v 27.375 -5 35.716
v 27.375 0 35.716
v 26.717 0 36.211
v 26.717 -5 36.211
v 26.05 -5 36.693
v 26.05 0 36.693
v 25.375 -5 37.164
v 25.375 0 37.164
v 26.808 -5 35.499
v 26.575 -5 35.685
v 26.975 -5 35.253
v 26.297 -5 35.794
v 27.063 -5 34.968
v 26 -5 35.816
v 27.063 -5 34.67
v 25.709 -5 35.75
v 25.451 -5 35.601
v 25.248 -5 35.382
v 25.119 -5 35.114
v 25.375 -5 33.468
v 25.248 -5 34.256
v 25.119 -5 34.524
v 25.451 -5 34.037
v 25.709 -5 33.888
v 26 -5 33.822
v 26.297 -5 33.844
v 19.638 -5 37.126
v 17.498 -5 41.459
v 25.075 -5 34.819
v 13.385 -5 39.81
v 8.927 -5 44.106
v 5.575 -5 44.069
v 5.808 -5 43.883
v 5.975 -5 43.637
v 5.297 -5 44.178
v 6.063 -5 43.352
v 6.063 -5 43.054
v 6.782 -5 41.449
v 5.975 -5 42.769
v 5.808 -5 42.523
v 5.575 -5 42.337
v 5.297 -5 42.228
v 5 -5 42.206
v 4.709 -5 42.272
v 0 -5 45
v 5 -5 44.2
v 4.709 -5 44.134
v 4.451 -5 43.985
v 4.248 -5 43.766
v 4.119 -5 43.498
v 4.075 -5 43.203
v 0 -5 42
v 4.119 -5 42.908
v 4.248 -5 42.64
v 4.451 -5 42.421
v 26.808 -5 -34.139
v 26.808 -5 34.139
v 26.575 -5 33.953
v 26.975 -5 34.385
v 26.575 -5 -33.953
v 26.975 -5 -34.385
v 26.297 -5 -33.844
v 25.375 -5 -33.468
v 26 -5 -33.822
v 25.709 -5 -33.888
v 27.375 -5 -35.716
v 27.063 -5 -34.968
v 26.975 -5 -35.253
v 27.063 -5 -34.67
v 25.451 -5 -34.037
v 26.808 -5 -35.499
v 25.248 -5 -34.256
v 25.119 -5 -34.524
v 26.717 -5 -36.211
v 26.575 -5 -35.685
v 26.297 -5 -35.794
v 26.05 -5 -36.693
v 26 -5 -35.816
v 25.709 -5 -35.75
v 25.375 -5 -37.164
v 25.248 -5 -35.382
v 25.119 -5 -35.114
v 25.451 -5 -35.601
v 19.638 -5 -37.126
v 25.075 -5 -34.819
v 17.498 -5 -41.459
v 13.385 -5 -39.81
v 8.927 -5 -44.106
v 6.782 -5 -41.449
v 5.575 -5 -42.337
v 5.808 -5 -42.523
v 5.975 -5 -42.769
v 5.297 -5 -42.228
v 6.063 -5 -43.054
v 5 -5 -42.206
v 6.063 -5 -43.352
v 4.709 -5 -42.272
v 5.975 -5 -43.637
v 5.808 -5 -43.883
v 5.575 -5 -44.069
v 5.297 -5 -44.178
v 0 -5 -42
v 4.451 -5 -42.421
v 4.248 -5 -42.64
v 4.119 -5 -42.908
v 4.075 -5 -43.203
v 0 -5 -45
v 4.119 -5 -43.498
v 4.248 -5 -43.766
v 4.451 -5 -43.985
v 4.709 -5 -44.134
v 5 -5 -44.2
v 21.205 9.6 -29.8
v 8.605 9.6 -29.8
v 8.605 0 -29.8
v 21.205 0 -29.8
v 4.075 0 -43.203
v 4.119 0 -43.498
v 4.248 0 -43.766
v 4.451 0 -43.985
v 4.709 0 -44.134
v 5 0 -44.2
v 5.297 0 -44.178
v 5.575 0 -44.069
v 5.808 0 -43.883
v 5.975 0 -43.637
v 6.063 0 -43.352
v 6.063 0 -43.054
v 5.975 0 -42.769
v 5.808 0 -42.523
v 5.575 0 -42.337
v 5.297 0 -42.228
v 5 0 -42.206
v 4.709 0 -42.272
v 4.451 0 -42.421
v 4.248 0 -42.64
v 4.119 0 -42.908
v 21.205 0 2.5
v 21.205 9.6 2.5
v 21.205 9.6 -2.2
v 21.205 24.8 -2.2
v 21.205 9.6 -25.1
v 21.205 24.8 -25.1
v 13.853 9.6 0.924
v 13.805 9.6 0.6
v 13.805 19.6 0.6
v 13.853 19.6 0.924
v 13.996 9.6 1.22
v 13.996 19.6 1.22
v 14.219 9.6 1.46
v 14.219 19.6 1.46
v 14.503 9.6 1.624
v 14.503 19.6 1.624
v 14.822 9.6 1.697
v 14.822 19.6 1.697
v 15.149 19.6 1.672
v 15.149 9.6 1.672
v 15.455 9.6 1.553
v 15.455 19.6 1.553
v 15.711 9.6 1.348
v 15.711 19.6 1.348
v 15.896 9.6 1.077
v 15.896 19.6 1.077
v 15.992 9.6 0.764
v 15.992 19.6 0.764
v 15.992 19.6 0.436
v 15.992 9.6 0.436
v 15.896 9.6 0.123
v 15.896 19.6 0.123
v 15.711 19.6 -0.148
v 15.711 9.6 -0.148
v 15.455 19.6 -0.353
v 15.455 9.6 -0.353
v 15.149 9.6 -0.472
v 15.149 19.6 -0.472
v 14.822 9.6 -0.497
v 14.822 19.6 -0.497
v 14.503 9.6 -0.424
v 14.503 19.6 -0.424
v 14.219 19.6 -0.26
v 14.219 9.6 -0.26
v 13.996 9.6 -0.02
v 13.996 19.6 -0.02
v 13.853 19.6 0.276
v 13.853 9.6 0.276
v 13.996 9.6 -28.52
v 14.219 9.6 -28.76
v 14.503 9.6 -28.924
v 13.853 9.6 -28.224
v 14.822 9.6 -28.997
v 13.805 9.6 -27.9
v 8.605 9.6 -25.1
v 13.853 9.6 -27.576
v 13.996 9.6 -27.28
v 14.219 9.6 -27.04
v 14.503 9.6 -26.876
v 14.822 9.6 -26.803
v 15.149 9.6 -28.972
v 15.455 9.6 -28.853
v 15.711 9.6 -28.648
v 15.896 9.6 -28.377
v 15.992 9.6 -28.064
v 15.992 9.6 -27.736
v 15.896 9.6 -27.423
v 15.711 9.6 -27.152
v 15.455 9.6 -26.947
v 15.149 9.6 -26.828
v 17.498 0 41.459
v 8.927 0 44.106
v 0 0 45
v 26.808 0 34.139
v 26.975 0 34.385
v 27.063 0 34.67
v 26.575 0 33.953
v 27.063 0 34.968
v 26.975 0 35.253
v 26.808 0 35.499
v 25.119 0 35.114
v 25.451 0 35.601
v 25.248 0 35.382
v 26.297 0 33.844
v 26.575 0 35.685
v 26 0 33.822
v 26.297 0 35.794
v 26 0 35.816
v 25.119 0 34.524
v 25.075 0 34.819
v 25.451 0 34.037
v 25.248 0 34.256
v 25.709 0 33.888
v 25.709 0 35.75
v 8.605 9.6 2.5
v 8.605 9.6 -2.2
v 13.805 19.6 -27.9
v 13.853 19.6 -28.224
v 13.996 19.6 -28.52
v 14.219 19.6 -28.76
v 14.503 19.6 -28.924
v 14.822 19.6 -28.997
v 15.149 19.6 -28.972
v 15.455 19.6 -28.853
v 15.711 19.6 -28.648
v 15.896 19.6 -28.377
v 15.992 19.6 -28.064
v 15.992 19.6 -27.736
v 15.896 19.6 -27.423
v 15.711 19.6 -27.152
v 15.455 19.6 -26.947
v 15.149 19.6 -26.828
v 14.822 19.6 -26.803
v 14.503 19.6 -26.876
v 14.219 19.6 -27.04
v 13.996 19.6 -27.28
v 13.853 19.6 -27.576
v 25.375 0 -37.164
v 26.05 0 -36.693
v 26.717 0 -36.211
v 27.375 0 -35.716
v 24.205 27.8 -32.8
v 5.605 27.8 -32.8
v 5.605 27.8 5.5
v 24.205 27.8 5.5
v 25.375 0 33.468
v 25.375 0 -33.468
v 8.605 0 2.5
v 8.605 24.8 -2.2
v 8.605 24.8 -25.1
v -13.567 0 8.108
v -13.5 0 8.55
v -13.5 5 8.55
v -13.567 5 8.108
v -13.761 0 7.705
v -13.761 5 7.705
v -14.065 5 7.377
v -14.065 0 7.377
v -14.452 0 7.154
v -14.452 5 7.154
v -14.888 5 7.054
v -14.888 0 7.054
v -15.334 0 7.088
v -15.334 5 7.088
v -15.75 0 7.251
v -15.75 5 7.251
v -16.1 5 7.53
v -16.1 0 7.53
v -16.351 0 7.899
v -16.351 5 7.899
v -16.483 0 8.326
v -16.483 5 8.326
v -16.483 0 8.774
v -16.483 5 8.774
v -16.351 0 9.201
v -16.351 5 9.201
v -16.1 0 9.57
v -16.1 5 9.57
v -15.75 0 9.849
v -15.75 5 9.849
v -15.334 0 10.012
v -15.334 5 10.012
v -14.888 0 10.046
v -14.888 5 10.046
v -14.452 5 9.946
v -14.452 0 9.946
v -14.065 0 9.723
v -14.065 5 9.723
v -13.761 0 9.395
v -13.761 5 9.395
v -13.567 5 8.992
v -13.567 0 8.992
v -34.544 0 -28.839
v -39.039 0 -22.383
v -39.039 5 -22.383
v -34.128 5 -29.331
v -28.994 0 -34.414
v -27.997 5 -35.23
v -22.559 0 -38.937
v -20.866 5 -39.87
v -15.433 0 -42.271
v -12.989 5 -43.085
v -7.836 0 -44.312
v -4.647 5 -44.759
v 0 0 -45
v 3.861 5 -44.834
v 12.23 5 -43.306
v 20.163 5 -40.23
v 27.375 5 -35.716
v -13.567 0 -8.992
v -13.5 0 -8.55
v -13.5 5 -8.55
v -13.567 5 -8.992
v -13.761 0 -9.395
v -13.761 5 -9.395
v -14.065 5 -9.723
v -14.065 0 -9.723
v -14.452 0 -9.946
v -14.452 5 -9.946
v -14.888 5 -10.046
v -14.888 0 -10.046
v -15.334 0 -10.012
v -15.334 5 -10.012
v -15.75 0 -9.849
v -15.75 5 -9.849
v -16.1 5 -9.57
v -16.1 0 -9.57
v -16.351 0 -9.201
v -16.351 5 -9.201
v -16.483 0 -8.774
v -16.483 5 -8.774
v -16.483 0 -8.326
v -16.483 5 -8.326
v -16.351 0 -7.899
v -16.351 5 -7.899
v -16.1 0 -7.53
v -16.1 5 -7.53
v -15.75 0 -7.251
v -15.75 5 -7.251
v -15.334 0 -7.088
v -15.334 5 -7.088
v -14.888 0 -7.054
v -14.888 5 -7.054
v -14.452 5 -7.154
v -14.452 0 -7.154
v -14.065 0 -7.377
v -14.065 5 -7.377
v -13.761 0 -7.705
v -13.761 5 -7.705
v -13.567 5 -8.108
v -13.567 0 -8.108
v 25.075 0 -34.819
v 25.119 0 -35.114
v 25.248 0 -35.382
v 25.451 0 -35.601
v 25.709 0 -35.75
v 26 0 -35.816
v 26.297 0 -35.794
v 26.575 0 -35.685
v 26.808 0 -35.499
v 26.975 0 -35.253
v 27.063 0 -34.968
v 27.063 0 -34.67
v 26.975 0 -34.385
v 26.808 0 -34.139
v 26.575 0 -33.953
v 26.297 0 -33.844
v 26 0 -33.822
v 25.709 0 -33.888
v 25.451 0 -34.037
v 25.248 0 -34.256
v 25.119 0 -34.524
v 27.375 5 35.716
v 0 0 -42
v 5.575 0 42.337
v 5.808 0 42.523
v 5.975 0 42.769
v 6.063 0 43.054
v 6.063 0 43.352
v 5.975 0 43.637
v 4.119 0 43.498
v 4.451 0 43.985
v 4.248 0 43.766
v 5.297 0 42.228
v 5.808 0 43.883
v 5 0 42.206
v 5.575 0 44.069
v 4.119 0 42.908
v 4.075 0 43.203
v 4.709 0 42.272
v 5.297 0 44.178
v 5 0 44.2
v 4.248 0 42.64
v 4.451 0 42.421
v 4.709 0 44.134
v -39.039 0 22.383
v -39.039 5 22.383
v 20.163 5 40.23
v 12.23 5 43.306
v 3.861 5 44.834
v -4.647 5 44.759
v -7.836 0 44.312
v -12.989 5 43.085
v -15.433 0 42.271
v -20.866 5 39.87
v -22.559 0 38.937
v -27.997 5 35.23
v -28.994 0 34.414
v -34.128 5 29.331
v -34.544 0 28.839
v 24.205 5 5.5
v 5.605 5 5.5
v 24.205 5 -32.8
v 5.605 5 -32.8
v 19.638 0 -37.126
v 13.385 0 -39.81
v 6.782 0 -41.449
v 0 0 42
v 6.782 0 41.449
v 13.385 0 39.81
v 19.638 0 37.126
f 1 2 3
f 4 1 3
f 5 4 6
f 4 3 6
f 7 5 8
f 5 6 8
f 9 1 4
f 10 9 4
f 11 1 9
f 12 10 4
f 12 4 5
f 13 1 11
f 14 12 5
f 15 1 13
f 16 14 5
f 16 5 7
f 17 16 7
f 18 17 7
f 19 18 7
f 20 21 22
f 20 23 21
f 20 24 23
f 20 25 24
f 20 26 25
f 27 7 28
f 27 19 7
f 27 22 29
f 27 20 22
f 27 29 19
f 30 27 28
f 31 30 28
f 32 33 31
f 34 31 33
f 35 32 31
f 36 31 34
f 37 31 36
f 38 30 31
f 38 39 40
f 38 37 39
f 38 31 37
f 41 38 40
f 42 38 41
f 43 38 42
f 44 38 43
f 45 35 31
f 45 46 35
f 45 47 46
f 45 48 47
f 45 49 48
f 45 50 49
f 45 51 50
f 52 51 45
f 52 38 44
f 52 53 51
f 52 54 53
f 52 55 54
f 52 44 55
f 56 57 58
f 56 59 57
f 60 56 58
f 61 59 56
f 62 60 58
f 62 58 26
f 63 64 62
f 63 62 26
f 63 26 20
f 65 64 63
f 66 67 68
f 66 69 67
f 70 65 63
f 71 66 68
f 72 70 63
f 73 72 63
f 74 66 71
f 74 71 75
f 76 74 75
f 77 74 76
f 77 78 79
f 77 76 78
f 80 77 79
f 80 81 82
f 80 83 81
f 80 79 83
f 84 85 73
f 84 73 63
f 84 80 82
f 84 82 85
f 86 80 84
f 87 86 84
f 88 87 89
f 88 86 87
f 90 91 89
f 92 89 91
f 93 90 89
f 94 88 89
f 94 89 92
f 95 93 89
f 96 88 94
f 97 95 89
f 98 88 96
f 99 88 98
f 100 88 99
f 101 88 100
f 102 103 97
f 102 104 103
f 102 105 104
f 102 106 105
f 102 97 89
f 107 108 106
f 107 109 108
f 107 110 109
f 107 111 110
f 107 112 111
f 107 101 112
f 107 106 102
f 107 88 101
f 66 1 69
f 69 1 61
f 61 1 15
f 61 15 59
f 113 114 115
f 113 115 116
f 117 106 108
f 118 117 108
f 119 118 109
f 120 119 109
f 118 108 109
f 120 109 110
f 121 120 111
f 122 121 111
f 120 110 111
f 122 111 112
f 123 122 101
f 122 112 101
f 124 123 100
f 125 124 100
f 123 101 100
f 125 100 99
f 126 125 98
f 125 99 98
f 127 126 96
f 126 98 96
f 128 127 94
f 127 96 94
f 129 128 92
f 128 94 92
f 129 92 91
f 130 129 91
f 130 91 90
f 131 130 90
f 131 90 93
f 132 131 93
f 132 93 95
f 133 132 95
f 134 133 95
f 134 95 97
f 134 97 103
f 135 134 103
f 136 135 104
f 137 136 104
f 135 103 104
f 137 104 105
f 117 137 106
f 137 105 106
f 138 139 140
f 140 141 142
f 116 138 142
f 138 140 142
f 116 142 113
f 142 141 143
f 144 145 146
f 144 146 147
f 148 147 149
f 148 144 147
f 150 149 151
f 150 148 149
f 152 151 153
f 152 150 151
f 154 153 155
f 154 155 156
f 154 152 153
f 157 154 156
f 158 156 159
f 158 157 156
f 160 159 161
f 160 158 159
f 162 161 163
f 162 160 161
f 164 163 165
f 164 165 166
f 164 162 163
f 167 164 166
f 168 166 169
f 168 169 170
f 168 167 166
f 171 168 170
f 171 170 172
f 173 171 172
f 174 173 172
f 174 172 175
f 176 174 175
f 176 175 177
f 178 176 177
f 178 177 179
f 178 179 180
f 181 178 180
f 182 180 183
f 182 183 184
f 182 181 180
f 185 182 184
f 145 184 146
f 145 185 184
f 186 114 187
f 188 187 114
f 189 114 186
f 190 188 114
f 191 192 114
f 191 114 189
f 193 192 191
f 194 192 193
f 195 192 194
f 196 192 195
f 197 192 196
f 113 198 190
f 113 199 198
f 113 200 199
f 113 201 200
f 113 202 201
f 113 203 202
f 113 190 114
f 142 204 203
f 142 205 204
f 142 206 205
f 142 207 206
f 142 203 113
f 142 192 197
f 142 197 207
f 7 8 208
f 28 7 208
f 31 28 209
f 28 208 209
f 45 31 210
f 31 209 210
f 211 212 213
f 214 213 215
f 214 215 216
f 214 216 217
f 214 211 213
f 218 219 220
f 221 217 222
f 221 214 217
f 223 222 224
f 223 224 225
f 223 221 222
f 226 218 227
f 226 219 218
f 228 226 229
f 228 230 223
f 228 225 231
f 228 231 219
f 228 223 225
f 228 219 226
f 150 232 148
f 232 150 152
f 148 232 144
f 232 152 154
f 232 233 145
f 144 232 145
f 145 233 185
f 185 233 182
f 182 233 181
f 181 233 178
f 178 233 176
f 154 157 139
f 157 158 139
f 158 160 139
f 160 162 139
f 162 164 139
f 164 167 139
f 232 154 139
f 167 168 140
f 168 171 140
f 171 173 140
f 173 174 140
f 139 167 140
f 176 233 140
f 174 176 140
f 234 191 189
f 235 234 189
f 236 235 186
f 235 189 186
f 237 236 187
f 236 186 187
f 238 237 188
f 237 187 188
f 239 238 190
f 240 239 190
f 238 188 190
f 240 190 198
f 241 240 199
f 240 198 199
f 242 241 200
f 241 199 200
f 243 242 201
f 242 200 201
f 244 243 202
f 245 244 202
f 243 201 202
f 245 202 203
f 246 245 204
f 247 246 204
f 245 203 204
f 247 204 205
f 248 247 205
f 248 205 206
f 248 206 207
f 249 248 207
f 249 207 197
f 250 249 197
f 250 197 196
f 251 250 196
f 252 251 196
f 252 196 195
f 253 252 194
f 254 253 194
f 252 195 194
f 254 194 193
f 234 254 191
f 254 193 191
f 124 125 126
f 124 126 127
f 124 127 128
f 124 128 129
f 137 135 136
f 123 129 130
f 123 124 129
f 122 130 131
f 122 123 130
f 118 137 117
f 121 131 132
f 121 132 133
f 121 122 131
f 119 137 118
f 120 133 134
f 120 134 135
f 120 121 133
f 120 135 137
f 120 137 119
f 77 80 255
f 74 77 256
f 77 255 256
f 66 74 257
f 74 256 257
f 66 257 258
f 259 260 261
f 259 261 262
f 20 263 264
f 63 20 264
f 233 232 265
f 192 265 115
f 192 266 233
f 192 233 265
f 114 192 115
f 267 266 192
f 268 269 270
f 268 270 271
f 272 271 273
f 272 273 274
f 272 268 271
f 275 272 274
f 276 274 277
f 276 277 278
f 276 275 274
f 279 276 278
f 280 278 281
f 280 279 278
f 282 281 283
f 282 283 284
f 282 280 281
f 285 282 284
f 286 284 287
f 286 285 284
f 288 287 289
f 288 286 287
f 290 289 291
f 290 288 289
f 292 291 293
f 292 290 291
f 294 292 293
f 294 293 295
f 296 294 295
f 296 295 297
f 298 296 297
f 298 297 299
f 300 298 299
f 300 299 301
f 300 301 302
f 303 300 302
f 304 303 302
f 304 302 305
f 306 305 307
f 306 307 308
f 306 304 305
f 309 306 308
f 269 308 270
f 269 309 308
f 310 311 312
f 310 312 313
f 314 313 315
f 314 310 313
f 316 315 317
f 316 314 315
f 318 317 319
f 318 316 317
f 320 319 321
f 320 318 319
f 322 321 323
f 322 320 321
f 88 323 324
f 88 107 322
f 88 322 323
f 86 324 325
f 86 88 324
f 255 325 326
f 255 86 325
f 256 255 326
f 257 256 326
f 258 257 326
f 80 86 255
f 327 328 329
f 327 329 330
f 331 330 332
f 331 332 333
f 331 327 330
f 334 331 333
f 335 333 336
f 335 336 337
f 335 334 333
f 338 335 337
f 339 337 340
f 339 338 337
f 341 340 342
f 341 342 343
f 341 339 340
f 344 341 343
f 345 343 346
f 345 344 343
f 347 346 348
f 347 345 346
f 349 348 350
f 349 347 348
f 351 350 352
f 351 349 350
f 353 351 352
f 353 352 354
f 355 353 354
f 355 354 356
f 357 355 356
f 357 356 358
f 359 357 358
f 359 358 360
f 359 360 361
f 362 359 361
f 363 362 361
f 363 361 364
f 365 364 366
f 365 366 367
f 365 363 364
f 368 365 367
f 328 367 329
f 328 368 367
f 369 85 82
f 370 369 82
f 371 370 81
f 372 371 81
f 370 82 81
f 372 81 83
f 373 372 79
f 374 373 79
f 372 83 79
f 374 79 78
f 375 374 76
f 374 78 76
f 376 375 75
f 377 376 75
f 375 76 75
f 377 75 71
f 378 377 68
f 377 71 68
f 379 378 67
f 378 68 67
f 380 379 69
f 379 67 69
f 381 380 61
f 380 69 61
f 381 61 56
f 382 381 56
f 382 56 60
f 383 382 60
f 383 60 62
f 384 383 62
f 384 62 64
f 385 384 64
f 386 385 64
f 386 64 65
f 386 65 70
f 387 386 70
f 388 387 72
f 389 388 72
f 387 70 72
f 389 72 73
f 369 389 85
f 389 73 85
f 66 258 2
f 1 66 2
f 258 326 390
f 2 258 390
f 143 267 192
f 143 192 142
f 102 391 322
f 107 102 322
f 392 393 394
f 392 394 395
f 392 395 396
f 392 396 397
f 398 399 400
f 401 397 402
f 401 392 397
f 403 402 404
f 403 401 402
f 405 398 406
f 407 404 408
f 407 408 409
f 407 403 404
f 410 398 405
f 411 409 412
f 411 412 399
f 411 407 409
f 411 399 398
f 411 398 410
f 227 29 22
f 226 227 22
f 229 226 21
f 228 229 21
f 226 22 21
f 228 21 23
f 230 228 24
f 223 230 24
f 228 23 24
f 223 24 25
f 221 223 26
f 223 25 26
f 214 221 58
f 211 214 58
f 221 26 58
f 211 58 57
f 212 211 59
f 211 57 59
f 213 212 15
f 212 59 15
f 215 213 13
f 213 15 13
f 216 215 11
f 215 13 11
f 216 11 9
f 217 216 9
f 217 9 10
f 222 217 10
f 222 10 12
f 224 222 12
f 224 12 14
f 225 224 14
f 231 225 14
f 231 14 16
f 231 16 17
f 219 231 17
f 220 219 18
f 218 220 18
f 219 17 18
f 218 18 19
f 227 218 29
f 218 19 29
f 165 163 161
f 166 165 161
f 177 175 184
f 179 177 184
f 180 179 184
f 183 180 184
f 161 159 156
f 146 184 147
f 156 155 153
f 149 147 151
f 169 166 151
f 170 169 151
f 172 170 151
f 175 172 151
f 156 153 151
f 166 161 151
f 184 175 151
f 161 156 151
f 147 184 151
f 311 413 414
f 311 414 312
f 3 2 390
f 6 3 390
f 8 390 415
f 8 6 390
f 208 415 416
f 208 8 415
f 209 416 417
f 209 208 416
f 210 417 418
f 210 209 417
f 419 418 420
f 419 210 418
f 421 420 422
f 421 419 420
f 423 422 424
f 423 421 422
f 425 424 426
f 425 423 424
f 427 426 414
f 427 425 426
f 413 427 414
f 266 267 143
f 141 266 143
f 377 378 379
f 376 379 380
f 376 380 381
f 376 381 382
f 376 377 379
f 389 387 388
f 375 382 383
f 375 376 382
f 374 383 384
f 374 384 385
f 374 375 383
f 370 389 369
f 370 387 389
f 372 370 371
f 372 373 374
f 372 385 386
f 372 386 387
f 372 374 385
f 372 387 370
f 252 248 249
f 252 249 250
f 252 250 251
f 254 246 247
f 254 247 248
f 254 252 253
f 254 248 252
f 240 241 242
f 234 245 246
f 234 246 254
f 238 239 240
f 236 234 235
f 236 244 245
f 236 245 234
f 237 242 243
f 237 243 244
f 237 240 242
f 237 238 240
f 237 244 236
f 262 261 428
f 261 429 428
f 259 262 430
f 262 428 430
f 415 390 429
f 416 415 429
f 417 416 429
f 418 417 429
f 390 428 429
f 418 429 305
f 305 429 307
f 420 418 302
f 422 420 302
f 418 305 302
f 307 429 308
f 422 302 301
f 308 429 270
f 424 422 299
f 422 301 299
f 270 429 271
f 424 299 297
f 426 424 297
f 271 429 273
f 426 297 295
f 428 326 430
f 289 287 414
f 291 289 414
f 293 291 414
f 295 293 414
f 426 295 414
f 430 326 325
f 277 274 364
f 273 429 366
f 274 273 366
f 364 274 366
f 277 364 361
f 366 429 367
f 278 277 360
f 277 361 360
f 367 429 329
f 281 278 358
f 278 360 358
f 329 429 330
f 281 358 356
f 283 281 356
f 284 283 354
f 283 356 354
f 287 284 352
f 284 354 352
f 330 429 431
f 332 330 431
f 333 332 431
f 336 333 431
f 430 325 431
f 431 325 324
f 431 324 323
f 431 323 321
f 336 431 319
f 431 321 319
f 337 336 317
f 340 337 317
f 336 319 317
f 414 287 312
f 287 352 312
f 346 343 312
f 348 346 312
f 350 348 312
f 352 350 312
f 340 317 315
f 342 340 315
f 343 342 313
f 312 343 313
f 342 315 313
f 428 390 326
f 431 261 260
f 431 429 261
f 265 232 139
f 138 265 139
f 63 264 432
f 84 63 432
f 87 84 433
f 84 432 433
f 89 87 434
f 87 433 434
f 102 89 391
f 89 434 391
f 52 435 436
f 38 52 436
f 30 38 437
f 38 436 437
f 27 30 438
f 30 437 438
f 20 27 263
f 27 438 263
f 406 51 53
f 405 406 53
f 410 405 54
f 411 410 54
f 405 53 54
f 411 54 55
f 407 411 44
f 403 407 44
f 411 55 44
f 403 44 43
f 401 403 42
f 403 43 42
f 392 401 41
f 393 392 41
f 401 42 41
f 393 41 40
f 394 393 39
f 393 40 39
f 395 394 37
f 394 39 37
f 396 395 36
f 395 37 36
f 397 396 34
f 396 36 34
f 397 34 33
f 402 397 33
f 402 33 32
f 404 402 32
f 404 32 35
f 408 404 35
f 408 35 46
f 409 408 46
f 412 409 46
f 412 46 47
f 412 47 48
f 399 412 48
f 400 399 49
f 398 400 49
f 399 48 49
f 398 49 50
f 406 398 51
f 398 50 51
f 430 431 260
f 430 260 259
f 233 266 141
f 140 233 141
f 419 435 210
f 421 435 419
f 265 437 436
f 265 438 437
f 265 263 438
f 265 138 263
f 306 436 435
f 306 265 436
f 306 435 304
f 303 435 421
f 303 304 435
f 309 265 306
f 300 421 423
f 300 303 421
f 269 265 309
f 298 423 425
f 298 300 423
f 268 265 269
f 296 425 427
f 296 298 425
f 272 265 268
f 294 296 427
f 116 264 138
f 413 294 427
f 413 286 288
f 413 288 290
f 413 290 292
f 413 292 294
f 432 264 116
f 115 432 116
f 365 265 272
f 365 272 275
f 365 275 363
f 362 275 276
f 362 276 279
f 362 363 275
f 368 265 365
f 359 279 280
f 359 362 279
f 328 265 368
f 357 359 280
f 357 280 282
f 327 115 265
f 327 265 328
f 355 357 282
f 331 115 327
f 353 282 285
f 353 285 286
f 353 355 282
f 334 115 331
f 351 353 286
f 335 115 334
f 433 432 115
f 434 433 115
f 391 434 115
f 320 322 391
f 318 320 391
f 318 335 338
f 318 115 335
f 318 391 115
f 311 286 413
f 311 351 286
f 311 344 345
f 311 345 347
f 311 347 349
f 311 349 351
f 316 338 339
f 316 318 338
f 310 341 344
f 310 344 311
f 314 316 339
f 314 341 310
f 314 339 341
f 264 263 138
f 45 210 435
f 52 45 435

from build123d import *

# Parameters (mm, degrees)
SKETCH_1_R          = 1.5
EXTRUDE_1_DEPTH     = 5
SKETCH_3_W          = 18.6
SKETCH_3_H          = 38.3
SKETCH_3_W_2        = 12.6
SKETCH_3_H_2        = 32.3
EXTRUDE_3_DEPTH     = 19.8
SKETCH_4_W          = 18.6
SKETCH_4_H          = 38.3
EXTRUDE_4_DEPTH     = 3
SKETCH_7_W          = 12.6
SKETCH_7_H          = 32.3
CUT_EXTRUDE_1_DEPTH = 5
SKETCH_8_W          = 35.927581395
SKETCH_8_H          = 53.234071865
CUT_EXTRUDE_2_DEPTH = 14.8
SKETCH_9_W          = 12.6
SKETCH_9_H          = 4.7
EXTRUDE_5_DEPTH     = 15.2
SKETCH_10_R         = 1.1
CUT_EXTRUDE_3_DEPTH = 10
EXTRUDE_6_DEPTH     = 5
SKETCH_13_R         = 1
CUT_EXTRUDE_4_DEPTH = 5


with BuildPart() as part:
    # 草图1 → 凸台-拉伸1 (new body)
    with BuildSketch(Plane(origin=(0, 0, 0), x_dir=(1, 0, 0), z_dir=(0, 1, 0))):
        with BuildLine():
            Line((-39.038561358, -22.382822144), (-39.038561358, 22.382822144))
            ThreePointArc((-39.038561358, 22.382822144), (-8.857541047, 44.119655105), (27.374530931, 35.716033603))
            Line((27.374530931, 35.716033603), (27.374530931, -35.716033603))
            ThreePointArc((27.374530931, -35.716033603), (-8.857541047, -44.119655105), (-39.038561358, -22.382822144))
        make_face()
        with Locations((-15, 8.55)):
            Circle(SKETCH_1_R, mode=Mode.SUBTRACT)
        with Locations((-15, -8.55)):
            Circle(SKETCH_1_R, mode=Mode.SUBTRACT)
    extrude(amount=EXTRUDE_1_DEPTH)

    # 草图3 → 凸台-拉伸3 (add, symmetric)
    with BuildSketch(Plane(origin=(0, 5, 0), x_dir=(1, 0, 0), z_dir=(0, 1, 0))):
        with Locations((14.904530931, 13.65)):
            Rectangle(SKETCH_3_W, SKETCH_3_H)
        with Locations((14.904530931, 13.65)):
            Rectangle(SKETCH_3_W_2, SKETCH_3_H_2, mode=Mode.SUBTRACT)
    extrude(amount=EXTRUDE_3_DEPTH, both=True)

    # 草图4 → 凸台-拉伸4 (add)
    with BuildSketch(Plane(origin=(0, 24.8, 0), x_dir=(1, 0, 0), z_dir=(0, 1, 0))):
        with Locations((14.904530931, 13.65)):
            Rectangle(SKETCH_4_W, SKETCH_4_H)
    extrude(amount=EXTRUDE_4_DEPTH)

    # 草图7 → 切除-拉伸1 (cut)
    with BuildSketch(Plane(origin=(0, 0, 0), x_dir=(-1, 0, 0), z_dir=(0, -1, 0))):
        with Locations((-14.904530931, 13.65)):
            Rectangle(SKETCH_7_W, SKETCH_7_H)
    extrude(amount=-CUT_EXTRUDE_1_DEPTH, mode=Mode.SUBTRACT)

    # 草图8 → 切除-拉伸2 (cut)
    with BuildSketch(Plane(origin=(0, -14.8, 0), x_dir=(-1, 0, 0), z_dir=(0, -1, 0))):
        with Locations((-13.744141361, 17.136677553)):
            Rectangle(SKETCH_8_W, SKETCH_8_H)
    extrude(amount=-CUT_EXTRUDE_2_DEPTH, mode=Mode.SUBTRACT)

    # 草图9 → 凸台-拉伸5 (add)
    with BuildSketch(Plane.XZ.offset(-24.8)):
        with Locations((14.904530931, -27.45)):
            Rectangle(SKETCH_9_W, SKETCH_9_H)
    extrude_5 = extrude(amount=EXTRUDE_5_DEPTH)

    # 草图10 → 切除-拉伸3 (cut)
    with BuildSketch(Plane(origin=(0, 9.6, 0), x_dir=(-1, 0, 0), z_dir=(0, -1, 0))):
        with Locations((-14.904530931, 27.9)):
            Circle(SKETCH_10_R)
    cut_extrude_3 = extrude(amount=-CUT_EXTRUDE_3_DEPTH, mode=Mode.SUBTRACT)

    # 镜向1: 凸台-拉伸5, 切除-拉伸3 across plane
    add(extrude_5.mirror(Plane.XY.offset(-13.65)))
    add(cut_extrude_3.mirror(Plane.XY.offset(-13.65)), mode=Mode.SUBTRACT)

    # 草图11 → 凸台-拉伸6 (add)
    with BuildSketch(Plane(origin=(0, 0, 0), x_dir=(-1, 0, 0), z_dir=(0, -1, 0))):
        with BuildLine():
            Line((0, 42), (0, 45))
            ThreePointArc((0, 45), (-13.278516311, 42.996290591), (-25.374530931, 37.163600203))
            Line((-25.374530931, 37.163600203), (-25.374530931, 33.46839076))
            ThreePointArc((-25.374530931, 33.46839076), (-13.385208031, 39.810001331), (0, 42))
        make_face()
        with BuildLine():
            Line((0, -45), (0, -42))
            ThreePointArc((0, -42), (-13.385208031, -39.810001331), (-25.374530931, -33.46839076))
            Line((-25.374530931, -33.46839076), (-25.374530931, -37.163600203))
            ThreePointArc((-25.374530931, -37.163600203), (-13.278516311, -42.996290591), (0, -45))
        make_face()
        with BuildLine():
            Line((-25.374530931, 33.46839076), (-25.374530931, 37.163600203))
            ThreePointArc((-25.374530931, 37.163600203), (-26.384460277, 36.453535575), (-27.374530931, 35.716033603))
            Line((-27.374530931, 35.716033603), (-27.374530931, 31.853336659))
            ThreePointArc((-27.374530931, 31.853336659), (-26.386890339, 32.676168965), (-25.374530931, 33.46839076))
        make_face()
        with BuildLine():
            Line((-25.374530931, -37.163600203), (-25.374530931, -33.46839076))
            ThreePointArc((-25.374530931, -33.46839076), (-26.386890339, -32.676168965), (-27.374530931, -31.853336659))
            Line((-27.374530931, -31.853336659), (-27.374530931, -35.716033603))
            ThreePointArc((-27.374530931, -35.716033603), (-26.384460277, -36.453535575), (-25.374530931, -37.163600203))
        make_face()
        with BuildLine():
            Line((-25.374530931, -33.46839076), (-25.374530931, 33.46839076))
            ThreePointArc((-25.374530931, 33.46839076), (-26.386890339, 32.676168965), (-27.374530931, 31.853336659))
            Line((-27.374530931, 31.853336659), (-27.374530931, -31.853336659))
            ThreePointArc((-27.374530931, -31.853336659), (-26.386890339, -32.676168965), (-25.374530931, -33.46839076))
        make_face()
        with BuildLine():
            Line((-25.374530931, 33.46839076), (-25.374530931, 37.163600203))
            ThreePointArc((-25.374530931, 37.163600203), (-26.384460277, 36.453535575), (-27.374530931, 35.716033603))
            Line((-27.374530931, 35.716033603), (-27.374530931, 31.853336659))
            ThreePointArc((-27.374530931, 31.853336659), (-26.386890339, 32.676168965), (-25.374530931, 33.46839076))
        make_face()
        with BuildLine():
            Line((-25.374530931, -37.163600203), (-25.374530931, -33.46839076))
            ThreePointArc((-25.374530931, -33.46839076), (-26.386890339, -32.676168965), (-27.374530931, -31.853336659))
            Line((-27.374530931, -31.853336659), (-27.374530931, -35.716033603))
            ThreePointArc((-27.374530931, -35.716033603), (-26.384460277, -36.453535575), (-25.374530931, -37.163600203))
        make_face()
        with BuildLine():
            Line((0, 42), (0, 45))
            ThreePointArc((0, 45), (-13.278516311, 42.996290591), (-25.374530931, 37.163600203))
            Line((-25.374530931, 37.163600203), (-25.374530931, 33.46839076))
            ThreePointArc((-25.374530931, 33.46839076), (-13.385208031, 39.810001331), (0, 42))
        make_face()
        with BuildLine():
            Line((0, -45), (0, -42))
            ThreePointArc((0, -42), (-13.385208031, -39.810001331), (-25.374530931, -33.46839076))
            Line((-25.374530931, -33.46839076), (-25.374530931, -37.163600203))
            ThreePointArc((-25.374530931, -37.163600203), (-13.278516311, -42.996290591), (0, -45))
        make_face()
    extrude(amount=EXTRUDE_6_DEPTH)

    # 草图13 → 切除-拉伸4 (cut)
    with BuildSketch(Plane(origin=(0, -5, 0), x_dir=(-1, 0, 0), z_dir=(0, -1, 0))):
        with Locations((-5.074530931, 43.202999153)):
            Circle(SKETCH_13_R)
        with Locations((-26.074530931, 34.819087247)):
            Circle(SKETCH_13_R)
        with Locations((-26.074530931, -34.819087247)):
            Circle(SKETCH_13_R)
        with Locations((-5.074530931, -43.202999153)):
            Circle(SKETCH_13_R)
    extrude(amount=-CUT_EXTRUDE_4_DEPTH, mode=Mode.SUBTRACT)


solid = part.part
